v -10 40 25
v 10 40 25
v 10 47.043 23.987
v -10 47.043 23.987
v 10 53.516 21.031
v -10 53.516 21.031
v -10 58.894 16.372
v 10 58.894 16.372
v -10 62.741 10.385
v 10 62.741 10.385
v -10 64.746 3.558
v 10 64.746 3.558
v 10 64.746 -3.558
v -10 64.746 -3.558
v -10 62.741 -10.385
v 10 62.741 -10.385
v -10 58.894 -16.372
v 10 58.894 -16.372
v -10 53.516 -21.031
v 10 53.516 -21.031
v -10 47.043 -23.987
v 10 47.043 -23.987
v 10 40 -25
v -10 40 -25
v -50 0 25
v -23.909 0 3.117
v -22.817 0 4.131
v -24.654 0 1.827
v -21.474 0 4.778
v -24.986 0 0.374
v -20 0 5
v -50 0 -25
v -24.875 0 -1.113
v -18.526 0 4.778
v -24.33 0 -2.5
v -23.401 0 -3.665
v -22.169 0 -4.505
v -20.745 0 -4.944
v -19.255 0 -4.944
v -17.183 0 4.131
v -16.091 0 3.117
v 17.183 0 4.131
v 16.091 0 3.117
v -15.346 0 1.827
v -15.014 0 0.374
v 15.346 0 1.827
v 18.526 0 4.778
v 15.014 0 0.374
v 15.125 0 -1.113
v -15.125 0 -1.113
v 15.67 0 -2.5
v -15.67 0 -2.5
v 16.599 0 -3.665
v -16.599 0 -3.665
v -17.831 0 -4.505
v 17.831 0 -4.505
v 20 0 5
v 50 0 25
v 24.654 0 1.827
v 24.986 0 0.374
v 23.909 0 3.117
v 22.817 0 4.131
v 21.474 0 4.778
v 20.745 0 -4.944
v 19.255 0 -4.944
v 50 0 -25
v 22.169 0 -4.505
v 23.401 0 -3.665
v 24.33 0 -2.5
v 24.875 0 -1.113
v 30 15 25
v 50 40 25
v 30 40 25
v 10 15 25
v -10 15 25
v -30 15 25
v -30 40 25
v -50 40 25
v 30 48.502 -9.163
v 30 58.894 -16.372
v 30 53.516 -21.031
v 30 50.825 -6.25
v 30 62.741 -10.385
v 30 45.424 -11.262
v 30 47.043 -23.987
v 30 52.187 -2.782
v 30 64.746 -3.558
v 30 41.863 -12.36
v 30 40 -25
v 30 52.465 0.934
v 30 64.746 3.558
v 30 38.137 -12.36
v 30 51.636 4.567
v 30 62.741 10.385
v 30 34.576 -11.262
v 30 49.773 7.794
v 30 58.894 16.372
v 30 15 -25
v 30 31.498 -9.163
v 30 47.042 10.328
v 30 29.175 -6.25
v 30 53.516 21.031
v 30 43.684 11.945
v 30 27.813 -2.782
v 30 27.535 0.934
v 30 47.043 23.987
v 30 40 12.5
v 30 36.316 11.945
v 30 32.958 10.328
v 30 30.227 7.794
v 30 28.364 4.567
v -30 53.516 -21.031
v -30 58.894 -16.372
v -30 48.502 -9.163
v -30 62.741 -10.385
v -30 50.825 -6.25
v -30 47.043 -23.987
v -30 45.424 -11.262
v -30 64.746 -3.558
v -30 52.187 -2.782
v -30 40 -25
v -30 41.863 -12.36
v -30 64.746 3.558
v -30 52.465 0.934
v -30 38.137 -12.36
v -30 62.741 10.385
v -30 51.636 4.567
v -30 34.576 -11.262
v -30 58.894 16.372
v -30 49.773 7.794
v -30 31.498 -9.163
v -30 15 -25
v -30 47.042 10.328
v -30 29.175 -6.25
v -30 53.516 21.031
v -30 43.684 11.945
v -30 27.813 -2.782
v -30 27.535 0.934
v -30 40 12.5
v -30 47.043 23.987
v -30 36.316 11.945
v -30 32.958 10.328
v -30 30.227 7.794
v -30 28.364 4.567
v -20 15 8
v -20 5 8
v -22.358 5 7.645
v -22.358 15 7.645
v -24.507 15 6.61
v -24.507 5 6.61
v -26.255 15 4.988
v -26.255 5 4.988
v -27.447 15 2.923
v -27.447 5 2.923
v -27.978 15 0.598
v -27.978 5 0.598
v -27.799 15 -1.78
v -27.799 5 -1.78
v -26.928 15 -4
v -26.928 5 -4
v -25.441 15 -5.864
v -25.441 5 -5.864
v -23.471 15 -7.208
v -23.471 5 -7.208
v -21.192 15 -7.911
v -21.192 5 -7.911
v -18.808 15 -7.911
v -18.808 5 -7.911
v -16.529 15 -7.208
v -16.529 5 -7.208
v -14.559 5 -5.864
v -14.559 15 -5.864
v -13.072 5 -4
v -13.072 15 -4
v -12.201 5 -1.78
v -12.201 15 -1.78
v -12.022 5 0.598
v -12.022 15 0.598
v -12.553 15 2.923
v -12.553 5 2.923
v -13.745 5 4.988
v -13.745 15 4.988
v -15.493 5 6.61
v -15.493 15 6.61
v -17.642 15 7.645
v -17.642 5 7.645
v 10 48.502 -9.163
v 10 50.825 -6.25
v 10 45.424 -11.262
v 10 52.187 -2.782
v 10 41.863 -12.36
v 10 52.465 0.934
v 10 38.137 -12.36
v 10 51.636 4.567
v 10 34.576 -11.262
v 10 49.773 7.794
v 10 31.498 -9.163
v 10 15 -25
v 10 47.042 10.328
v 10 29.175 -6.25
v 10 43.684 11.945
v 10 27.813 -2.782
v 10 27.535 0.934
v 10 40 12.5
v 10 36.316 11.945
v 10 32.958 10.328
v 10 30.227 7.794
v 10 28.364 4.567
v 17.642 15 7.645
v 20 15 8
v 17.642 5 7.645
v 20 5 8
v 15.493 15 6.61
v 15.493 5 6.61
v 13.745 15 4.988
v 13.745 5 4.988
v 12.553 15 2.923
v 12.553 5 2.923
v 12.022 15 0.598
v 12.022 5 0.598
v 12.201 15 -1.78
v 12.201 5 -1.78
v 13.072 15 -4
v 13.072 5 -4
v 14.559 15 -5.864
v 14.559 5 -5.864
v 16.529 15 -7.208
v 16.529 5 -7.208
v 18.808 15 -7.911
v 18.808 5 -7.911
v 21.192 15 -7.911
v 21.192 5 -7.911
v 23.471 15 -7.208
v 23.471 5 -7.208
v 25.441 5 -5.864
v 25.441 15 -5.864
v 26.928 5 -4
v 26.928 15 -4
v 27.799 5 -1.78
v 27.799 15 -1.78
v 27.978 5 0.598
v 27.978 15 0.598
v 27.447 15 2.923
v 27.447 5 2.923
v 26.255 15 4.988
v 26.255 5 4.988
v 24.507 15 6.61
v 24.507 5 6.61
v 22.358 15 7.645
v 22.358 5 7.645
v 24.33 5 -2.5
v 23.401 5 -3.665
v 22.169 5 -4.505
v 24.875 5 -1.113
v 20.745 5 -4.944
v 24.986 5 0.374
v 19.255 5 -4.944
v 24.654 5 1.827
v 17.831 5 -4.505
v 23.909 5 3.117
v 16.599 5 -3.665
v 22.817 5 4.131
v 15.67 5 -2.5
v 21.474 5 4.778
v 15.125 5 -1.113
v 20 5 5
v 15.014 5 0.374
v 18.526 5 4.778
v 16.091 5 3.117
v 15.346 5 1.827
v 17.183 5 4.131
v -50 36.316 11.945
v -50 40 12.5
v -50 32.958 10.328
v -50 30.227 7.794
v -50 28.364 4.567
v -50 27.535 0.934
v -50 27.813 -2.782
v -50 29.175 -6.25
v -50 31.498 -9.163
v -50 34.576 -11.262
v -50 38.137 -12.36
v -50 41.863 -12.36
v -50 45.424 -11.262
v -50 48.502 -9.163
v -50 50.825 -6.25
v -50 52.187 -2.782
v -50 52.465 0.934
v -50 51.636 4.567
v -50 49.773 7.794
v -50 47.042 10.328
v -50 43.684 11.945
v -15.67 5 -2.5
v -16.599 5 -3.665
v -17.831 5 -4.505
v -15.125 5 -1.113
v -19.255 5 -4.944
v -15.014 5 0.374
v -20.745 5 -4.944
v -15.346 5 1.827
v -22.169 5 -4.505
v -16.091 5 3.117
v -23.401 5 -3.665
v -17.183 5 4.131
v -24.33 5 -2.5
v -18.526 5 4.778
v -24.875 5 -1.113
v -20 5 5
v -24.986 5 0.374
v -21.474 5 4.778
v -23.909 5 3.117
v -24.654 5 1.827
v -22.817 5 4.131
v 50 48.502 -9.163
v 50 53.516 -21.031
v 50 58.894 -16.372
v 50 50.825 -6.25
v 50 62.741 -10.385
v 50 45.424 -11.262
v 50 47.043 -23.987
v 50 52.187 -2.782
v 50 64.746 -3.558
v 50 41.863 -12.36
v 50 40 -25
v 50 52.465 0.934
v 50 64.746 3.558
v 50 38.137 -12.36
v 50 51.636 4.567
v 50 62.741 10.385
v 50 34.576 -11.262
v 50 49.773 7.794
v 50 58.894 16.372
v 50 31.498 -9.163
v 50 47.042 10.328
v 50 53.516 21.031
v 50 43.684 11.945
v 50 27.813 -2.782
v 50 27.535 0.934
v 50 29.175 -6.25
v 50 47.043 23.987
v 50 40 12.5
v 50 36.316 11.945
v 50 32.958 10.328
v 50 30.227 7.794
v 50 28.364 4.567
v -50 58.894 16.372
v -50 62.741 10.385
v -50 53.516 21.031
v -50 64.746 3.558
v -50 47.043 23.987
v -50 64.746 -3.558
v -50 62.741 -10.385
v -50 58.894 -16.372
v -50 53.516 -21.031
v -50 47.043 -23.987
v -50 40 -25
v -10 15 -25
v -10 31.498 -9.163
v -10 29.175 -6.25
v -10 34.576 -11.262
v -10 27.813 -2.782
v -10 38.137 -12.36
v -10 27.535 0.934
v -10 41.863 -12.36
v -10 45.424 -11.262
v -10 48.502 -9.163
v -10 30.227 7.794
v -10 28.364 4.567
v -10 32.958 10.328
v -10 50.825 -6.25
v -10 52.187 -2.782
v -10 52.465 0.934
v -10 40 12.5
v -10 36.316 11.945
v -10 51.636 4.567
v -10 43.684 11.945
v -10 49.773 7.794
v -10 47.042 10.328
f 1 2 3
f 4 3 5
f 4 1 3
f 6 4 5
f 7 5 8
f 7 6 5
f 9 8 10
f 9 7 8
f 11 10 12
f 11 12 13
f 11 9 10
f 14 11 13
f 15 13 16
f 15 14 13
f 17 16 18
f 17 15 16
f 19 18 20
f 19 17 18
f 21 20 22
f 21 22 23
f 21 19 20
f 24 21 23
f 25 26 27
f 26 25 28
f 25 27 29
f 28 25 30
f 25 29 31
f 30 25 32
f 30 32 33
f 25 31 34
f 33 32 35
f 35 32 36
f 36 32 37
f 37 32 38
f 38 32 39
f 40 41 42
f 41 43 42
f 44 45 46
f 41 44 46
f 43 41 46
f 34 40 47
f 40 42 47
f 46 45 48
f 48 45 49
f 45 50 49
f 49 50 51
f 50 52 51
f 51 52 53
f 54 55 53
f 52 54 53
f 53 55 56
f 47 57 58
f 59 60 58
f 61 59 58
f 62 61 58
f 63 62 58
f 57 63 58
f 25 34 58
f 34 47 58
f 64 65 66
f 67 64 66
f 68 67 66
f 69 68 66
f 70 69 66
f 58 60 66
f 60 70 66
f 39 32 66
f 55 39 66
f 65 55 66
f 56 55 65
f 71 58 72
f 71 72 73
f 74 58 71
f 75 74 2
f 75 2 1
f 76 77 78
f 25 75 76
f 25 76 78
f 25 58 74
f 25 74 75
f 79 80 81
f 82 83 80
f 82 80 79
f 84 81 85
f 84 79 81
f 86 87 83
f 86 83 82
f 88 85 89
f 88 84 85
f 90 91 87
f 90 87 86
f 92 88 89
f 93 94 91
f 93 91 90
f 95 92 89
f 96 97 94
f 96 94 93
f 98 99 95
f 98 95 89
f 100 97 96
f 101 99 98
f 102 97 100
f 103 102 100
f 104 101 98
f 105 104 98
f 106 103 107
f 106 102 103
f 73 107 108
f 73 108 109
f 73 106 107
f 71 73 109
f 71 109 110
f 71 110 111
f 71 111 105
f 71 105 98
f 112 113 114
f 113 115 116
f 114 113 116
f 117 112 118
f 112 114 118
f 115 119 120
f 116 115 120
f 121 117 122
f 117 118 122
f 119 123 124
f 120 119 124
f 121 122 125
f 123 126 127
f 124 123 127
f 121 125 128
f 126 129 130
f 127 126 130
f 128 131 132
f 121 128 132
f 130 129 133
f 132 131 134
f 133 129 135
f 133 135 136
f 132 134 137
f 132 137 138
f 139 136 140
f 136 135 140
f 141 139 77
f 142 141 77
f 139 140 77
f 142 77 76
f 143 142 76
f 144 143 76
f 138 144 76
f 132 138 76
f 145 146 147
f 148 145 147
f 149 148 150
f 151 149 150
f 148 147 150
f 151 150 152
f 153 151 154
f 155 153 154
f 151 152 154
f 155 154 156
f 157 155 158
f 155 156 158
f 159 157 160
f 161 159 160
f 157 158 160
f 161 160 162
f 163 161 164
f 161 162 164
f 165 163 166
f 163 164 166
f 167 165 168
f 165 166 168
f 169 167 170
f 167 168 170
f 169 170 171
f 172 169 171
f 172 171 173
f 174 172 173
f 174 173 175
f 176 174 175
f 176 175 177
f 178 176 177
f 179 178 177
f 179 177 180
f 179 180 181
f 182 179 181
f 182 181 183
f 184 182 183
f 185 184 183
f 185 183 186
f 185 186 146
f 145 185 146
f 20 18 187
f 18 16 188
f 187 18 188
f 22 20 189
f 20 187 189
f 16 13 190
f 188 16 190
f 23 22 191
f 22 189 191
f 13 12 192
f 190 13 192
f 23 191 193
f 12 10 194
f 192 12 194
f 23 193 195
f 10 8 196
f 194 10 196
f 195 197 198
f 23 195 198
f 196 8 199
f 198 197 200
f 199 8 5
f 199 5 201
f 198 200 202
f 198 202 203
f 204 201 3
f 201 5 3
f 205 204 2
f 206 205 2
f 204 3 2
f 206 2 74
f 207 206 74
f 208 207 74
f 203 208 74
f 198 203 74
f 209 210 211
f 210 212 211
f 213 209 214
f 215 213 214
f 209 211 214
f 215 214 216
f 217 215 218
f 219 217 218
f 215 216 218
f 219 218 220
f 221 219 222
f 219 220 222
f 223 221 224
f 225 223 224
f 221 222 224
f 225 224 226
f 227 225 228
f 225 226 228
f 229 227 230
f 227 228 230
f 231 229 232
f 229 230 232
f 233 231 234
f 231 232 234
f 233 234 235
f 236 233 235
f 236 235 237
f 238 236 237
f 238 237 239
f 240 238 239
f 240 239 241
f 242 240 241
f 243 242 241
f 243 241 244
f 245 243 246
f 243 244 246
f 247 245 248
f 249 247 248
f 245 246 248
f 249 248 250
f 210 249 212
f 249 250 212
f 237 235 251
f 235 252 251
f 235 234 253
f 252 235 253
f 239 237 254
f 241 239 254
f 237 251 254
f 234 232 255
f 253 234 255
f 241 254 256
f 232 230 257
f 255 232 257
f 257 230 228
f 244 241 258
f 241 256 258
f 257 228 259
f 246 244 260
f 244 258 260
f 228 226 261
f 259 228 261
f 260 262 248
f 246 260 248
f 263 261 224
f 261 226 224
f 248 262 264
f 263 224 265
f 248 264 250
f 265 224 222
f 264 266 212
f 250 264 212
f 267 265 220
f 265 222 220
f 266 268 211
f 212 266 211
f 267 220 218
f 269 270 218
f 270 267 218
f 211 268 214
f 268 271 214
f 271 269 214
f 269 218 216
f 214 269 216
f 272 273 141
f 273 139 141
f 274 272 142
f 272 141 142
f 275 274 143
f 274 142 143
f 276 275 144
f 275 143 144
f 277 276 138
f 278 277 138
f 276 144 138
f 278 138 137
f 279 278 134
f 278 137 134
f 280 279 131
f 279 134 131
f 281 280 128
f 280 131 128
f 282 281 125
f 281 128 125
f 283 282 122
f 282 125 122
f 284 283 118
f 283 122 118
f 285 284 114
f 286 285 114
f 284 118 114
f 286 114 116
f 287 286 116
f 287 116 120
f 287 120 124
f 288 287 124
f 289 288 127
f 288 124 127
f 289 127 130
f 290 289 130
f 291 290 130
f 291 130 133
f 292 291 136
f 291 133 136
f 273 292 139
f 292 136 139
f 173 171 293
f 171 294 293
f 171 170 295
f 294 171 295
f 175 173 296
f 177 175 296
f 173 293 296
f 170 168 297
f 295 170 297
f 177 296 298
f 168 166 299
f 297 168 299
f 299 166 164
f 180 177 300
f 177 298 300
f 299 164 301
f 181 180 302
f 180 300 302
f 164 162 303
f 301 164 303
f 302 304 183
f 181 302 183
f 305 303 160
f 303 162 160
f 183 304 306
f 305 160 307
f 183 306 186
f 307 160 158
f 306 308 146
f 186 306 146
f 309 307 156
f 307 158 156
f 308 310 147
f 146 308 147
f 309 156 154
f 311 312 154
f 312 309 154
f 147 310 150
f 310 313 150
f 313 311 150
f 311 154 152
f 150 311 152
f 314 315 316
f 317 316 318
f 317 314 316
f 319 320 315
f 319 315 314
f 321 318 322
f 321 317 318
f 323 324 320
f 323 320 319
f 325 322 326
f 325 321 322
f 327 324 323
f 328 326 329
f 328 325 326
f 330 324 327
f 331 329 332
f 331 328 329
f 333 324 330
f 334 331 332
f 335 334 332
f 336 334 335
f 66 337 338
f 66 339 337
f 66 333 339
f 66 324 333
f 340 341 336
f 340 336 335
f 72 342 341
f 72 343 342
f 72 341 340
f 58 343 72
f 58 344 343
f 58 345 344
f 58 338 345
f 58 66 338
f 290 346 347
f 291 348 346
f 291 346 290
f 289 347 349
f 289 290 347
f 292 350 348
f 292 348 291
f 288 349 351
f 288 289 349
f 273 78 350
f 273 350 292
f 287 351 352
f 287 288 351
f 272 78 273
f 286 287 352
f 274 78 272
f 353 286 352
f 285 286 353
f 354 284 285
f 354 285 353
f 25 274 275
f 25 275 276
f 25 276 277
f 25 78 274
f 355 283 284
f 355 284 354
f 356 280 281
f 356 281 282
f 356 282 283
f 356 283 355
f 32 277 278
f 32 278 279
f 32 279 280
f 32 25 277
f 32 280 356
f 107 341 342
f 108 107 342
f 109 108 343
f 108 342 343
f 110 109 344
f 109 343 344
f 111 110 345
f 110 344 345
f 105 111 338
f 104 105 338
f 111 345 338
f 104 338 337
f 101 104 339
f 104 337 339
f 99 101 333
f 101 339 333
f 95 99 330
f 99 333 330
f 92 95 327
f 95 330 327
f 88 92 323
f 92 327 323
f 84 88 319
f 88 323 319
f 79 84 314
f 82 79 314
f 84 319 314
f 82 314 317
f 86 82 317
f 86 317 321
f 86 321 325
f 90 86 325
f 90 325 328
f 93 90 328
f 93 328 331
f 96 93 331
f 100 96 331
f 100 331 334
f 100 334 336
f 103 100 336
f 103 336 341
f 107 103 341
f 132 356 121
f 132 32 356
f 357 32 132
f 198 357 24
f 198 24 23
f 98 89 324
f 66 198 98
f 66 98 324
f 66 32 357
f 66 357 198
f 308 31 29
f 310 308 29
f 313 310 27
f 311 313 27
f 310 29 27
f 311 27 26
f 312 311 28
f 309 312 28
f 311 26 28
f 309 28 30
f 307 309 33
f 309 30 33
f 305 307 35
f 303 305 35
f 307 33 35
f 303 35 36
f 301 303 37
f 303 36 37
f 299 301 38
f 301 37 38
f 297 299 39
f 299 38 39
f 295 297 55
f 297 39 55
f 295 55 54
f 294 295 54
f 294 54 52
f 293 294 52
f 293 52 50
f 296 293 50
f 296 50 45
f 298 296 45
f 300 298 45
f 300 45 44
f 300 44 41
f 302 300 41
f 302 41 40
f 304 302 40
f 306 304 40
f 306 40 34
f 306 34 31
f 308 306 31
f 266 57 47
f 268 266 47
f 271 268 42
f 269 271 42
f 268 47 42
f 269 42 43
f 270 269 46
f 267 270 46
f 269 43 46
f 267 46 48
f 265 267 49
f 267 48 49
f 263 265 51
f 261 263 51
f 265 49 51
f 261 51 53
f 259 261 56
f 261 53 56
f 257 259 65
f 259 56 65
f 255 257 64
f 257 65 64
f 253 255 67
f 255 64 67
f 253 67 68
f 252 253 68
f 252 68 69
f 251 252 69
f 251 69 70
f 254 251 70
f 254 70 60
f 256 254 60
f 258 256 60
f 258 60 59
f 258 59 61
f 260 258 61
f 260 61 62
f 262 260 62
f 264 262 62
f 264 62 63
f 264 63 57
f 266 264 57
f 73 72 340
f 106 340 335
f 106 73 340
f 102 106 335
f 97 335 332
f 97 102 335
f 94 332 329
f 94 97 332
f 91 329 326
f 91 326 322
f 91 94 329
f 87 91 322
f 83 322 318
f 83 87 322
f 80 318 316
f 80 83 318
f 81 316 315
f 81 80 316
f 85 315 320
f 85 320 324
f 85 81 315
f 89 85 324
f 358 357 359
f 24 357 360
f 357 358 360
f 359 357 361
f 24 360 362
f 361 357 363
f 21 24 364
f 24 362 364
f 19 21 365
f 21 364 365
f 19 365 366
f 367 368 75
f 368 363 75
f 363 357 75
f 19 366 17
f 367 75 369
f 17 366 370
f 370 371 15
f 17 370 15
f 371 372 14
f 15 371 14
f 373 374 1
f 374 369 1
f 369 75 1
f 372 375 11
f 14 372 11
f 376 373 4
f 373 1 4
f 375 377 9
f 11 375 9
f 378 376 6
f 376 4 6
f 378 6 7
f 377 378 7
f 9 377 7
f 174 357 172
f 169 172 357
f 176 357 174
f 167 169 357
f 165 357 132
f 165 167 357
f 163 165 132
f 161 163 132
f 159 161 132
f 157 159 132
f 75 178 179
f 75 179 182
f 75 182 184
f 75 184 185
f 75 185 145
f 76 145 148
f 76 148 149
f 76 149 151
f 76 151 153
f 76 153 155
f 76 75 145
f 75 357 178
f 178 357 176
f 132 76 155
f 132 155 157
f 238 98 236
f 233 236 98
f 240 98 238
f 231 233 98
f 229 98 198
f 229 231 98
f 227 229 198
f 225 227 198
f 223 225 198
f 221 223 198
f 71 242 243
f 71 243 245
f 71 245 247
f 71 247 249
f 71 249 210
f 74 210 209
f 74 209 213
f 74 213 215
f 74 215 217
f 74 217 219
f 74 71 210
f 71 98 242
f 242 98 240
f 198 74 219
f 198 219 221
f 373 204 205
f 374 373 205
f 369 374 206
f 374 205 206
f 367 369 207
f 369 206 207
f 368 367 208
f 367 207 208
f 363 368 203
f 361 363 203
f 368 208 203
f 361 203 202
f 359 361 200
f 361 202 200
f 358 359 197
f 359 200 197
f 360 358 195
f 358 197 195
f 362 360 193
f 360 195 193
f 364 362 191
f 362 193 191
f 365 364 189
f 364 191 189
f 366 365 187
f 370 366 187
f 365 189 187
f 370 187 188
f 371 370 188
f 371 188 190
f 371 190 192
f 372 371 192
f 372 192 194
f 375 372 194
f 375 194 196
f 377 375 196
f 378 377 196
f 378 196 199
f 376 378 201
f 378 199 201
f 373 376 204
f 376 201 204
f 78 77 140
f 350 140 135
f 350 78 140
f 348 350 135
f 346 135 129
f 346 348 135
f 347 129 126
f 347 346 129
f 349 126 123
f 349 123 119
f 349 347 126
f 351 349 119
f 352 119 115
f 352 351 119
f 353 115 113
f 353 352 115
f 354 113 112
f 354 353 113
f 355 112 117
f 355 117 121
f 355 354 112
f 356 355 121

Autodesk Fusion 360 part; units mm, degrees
sketch "Sketch1" plane through (0, 0, 0) normal (0, 1, 0) x (1, 0, 0)
  line L0 (50, -25) -> (-50, -25)
  line L1 (-50, -25) -> (-50, 25)
  line L2 (-50, 25) -> (50, 25)
  line L3 (50, 25) -> (50, -25)
  line L4 (50, -25) -> (-50, 25) construction
  line L5 (-50, -25) -> (50, 25) construction
  dimension "d1" = 100
  dimension "d2" = 50
extrude "Extrude1" add sketch "Sketch1" along normal blind 65
sketch "Sketch2" plane through (0, 0, 25) normal (0, 0, 1) x (1, 0, 0)
  line L0 (-50, 0) -> (50, 0)
  line L1 (50, 0) -> (50, 65)
  line L2 (50, 65) -> (-50, 65)
  line L3 (-50, 65) -> (-50, 0)
  line L4 (-50, 0) -> (50, 0)
  line L5 (50, 0) -> (50, 15)
  line L6 (50, 15) -> (-50, 15)
  line L7 (-50, 15) -> (-50, 0)
  line L8 (-40, 15) -> (-50, 15)
  line L9 (-50, 15) -> (-50, 65)
  line L10 (-50, 65) -> (-40, 65)
  line L11 (40, 15) -> (50, 15)
  line L12 (50, 15) -> (50, 65)
  line L13 (50, 65) -> (40, 65)
  line L14 (-10, 65) -> (10, 65)
  line L15 (10, 65) -> (10, 15)
  line L16 (10, 15) -> (-10, 15)
  line L17 (-10, 15) -> (-10, 65)
  line L18 (10, 65) -> (30, 65)
  line L19 (30, 65) -> (30, 15)
  line L20 (30, 15) -> (10, 15)
  line L21 (10, 15) -> (10, 65)
  line L22 (-10, 65) -> (-30, 65)
  line L23 (-30, 65) -> (-30, 15)
  line L24 (-30, 15) -> (-10, 15)
  line L25 (-10, 15) -> (-10, 65)
  line L26 (-30, 65) -> (-50, 65)
  line L27 (-50, 65) -> (-50, 15)
  line L28 (-50, 15) -> (-30, 15)
  line L29 (-30, 15) -> (-30, 65)
  line L30 (30, 65) -> (50, 65)
  line L31 (50, 65) -> (50, 15)
  line L32 (50, 15) -> (30, 15)
  line L33 (30, 15) -> (30, 65)
  dimension "d5" = 100
  dimension "d6" = 15
  dimension "d7" = 20
  dimension "d8" = 20
  dimension "d9" = 20
  dimension "d10" = 20
  dimension "d11" = 20
extrude "Extrude2" cut sketch "Sketch2" against normal blind 50 contours L2 L6 L17 L22 L23 L24 L25 L29 | L2 L6 L15 L18 L19 L20 L21 L33
sketch "Sketch3" plane through (-50, 0, 0) normal (-1, 0, 0) x (0, 0, 1)
  line L0 (-25, 0) -> (25, 0)
  line L1 (25, 0) -> (25, 65)
  line L2 (25, 65) -> (-25, 65)
  line L3 (-25, 65) -> (-25, 0)
  circle A0 centre (0, 40) radius 25
  dimension "d14" = 50
  dimension "d15" = 40
extrude "Extrude3" cut sketch "Sketch3" against normal blind 100 contours L2 L3 A0 | L1 L2 A0
sketch "Sketch4" plane through (-50, 0, 0) normal (-1, 0, 0) x (0, 0, 1)
  arc A0 (25, 40) -> (-25, 40) centre (0, 40) ccw
  line L0 (-25, 40) -> (-25, 0)
  line L1 (-25, 0) -> (25, 0)
  line L2 (25, 0) -> (25, 40)
  line L3 (0, 40) -> (0, 0)
hole "Hole1" at (-50, 40, 0) direction (1, 0, 0) diameter 25 end through all
sketch "Sketch5" plane through (0, 15, 0) normal (0, 1, 0) x (-1, 0, 0)
  line L0 (30, 25) -> (10, 25)
  line L1 (10, 25) -> (10, -25)
  line L2 (10, -25) -> (30, -25)
  line L3 (30, -25) -> (30, 25)
  line L4 (20, 0) -> (20, -25)
  line L5 (-20, 0) -> (-20, -25)
  dimension "d21" = 25
  dimension "d22" = 40
hole "Hole2" at (-20, 15, 0) at (20, 15, 0) direction (0, -1, 0) diameter 10 depth 100 tip angle 118 counterbore diameter 16 counterbore depth 10
